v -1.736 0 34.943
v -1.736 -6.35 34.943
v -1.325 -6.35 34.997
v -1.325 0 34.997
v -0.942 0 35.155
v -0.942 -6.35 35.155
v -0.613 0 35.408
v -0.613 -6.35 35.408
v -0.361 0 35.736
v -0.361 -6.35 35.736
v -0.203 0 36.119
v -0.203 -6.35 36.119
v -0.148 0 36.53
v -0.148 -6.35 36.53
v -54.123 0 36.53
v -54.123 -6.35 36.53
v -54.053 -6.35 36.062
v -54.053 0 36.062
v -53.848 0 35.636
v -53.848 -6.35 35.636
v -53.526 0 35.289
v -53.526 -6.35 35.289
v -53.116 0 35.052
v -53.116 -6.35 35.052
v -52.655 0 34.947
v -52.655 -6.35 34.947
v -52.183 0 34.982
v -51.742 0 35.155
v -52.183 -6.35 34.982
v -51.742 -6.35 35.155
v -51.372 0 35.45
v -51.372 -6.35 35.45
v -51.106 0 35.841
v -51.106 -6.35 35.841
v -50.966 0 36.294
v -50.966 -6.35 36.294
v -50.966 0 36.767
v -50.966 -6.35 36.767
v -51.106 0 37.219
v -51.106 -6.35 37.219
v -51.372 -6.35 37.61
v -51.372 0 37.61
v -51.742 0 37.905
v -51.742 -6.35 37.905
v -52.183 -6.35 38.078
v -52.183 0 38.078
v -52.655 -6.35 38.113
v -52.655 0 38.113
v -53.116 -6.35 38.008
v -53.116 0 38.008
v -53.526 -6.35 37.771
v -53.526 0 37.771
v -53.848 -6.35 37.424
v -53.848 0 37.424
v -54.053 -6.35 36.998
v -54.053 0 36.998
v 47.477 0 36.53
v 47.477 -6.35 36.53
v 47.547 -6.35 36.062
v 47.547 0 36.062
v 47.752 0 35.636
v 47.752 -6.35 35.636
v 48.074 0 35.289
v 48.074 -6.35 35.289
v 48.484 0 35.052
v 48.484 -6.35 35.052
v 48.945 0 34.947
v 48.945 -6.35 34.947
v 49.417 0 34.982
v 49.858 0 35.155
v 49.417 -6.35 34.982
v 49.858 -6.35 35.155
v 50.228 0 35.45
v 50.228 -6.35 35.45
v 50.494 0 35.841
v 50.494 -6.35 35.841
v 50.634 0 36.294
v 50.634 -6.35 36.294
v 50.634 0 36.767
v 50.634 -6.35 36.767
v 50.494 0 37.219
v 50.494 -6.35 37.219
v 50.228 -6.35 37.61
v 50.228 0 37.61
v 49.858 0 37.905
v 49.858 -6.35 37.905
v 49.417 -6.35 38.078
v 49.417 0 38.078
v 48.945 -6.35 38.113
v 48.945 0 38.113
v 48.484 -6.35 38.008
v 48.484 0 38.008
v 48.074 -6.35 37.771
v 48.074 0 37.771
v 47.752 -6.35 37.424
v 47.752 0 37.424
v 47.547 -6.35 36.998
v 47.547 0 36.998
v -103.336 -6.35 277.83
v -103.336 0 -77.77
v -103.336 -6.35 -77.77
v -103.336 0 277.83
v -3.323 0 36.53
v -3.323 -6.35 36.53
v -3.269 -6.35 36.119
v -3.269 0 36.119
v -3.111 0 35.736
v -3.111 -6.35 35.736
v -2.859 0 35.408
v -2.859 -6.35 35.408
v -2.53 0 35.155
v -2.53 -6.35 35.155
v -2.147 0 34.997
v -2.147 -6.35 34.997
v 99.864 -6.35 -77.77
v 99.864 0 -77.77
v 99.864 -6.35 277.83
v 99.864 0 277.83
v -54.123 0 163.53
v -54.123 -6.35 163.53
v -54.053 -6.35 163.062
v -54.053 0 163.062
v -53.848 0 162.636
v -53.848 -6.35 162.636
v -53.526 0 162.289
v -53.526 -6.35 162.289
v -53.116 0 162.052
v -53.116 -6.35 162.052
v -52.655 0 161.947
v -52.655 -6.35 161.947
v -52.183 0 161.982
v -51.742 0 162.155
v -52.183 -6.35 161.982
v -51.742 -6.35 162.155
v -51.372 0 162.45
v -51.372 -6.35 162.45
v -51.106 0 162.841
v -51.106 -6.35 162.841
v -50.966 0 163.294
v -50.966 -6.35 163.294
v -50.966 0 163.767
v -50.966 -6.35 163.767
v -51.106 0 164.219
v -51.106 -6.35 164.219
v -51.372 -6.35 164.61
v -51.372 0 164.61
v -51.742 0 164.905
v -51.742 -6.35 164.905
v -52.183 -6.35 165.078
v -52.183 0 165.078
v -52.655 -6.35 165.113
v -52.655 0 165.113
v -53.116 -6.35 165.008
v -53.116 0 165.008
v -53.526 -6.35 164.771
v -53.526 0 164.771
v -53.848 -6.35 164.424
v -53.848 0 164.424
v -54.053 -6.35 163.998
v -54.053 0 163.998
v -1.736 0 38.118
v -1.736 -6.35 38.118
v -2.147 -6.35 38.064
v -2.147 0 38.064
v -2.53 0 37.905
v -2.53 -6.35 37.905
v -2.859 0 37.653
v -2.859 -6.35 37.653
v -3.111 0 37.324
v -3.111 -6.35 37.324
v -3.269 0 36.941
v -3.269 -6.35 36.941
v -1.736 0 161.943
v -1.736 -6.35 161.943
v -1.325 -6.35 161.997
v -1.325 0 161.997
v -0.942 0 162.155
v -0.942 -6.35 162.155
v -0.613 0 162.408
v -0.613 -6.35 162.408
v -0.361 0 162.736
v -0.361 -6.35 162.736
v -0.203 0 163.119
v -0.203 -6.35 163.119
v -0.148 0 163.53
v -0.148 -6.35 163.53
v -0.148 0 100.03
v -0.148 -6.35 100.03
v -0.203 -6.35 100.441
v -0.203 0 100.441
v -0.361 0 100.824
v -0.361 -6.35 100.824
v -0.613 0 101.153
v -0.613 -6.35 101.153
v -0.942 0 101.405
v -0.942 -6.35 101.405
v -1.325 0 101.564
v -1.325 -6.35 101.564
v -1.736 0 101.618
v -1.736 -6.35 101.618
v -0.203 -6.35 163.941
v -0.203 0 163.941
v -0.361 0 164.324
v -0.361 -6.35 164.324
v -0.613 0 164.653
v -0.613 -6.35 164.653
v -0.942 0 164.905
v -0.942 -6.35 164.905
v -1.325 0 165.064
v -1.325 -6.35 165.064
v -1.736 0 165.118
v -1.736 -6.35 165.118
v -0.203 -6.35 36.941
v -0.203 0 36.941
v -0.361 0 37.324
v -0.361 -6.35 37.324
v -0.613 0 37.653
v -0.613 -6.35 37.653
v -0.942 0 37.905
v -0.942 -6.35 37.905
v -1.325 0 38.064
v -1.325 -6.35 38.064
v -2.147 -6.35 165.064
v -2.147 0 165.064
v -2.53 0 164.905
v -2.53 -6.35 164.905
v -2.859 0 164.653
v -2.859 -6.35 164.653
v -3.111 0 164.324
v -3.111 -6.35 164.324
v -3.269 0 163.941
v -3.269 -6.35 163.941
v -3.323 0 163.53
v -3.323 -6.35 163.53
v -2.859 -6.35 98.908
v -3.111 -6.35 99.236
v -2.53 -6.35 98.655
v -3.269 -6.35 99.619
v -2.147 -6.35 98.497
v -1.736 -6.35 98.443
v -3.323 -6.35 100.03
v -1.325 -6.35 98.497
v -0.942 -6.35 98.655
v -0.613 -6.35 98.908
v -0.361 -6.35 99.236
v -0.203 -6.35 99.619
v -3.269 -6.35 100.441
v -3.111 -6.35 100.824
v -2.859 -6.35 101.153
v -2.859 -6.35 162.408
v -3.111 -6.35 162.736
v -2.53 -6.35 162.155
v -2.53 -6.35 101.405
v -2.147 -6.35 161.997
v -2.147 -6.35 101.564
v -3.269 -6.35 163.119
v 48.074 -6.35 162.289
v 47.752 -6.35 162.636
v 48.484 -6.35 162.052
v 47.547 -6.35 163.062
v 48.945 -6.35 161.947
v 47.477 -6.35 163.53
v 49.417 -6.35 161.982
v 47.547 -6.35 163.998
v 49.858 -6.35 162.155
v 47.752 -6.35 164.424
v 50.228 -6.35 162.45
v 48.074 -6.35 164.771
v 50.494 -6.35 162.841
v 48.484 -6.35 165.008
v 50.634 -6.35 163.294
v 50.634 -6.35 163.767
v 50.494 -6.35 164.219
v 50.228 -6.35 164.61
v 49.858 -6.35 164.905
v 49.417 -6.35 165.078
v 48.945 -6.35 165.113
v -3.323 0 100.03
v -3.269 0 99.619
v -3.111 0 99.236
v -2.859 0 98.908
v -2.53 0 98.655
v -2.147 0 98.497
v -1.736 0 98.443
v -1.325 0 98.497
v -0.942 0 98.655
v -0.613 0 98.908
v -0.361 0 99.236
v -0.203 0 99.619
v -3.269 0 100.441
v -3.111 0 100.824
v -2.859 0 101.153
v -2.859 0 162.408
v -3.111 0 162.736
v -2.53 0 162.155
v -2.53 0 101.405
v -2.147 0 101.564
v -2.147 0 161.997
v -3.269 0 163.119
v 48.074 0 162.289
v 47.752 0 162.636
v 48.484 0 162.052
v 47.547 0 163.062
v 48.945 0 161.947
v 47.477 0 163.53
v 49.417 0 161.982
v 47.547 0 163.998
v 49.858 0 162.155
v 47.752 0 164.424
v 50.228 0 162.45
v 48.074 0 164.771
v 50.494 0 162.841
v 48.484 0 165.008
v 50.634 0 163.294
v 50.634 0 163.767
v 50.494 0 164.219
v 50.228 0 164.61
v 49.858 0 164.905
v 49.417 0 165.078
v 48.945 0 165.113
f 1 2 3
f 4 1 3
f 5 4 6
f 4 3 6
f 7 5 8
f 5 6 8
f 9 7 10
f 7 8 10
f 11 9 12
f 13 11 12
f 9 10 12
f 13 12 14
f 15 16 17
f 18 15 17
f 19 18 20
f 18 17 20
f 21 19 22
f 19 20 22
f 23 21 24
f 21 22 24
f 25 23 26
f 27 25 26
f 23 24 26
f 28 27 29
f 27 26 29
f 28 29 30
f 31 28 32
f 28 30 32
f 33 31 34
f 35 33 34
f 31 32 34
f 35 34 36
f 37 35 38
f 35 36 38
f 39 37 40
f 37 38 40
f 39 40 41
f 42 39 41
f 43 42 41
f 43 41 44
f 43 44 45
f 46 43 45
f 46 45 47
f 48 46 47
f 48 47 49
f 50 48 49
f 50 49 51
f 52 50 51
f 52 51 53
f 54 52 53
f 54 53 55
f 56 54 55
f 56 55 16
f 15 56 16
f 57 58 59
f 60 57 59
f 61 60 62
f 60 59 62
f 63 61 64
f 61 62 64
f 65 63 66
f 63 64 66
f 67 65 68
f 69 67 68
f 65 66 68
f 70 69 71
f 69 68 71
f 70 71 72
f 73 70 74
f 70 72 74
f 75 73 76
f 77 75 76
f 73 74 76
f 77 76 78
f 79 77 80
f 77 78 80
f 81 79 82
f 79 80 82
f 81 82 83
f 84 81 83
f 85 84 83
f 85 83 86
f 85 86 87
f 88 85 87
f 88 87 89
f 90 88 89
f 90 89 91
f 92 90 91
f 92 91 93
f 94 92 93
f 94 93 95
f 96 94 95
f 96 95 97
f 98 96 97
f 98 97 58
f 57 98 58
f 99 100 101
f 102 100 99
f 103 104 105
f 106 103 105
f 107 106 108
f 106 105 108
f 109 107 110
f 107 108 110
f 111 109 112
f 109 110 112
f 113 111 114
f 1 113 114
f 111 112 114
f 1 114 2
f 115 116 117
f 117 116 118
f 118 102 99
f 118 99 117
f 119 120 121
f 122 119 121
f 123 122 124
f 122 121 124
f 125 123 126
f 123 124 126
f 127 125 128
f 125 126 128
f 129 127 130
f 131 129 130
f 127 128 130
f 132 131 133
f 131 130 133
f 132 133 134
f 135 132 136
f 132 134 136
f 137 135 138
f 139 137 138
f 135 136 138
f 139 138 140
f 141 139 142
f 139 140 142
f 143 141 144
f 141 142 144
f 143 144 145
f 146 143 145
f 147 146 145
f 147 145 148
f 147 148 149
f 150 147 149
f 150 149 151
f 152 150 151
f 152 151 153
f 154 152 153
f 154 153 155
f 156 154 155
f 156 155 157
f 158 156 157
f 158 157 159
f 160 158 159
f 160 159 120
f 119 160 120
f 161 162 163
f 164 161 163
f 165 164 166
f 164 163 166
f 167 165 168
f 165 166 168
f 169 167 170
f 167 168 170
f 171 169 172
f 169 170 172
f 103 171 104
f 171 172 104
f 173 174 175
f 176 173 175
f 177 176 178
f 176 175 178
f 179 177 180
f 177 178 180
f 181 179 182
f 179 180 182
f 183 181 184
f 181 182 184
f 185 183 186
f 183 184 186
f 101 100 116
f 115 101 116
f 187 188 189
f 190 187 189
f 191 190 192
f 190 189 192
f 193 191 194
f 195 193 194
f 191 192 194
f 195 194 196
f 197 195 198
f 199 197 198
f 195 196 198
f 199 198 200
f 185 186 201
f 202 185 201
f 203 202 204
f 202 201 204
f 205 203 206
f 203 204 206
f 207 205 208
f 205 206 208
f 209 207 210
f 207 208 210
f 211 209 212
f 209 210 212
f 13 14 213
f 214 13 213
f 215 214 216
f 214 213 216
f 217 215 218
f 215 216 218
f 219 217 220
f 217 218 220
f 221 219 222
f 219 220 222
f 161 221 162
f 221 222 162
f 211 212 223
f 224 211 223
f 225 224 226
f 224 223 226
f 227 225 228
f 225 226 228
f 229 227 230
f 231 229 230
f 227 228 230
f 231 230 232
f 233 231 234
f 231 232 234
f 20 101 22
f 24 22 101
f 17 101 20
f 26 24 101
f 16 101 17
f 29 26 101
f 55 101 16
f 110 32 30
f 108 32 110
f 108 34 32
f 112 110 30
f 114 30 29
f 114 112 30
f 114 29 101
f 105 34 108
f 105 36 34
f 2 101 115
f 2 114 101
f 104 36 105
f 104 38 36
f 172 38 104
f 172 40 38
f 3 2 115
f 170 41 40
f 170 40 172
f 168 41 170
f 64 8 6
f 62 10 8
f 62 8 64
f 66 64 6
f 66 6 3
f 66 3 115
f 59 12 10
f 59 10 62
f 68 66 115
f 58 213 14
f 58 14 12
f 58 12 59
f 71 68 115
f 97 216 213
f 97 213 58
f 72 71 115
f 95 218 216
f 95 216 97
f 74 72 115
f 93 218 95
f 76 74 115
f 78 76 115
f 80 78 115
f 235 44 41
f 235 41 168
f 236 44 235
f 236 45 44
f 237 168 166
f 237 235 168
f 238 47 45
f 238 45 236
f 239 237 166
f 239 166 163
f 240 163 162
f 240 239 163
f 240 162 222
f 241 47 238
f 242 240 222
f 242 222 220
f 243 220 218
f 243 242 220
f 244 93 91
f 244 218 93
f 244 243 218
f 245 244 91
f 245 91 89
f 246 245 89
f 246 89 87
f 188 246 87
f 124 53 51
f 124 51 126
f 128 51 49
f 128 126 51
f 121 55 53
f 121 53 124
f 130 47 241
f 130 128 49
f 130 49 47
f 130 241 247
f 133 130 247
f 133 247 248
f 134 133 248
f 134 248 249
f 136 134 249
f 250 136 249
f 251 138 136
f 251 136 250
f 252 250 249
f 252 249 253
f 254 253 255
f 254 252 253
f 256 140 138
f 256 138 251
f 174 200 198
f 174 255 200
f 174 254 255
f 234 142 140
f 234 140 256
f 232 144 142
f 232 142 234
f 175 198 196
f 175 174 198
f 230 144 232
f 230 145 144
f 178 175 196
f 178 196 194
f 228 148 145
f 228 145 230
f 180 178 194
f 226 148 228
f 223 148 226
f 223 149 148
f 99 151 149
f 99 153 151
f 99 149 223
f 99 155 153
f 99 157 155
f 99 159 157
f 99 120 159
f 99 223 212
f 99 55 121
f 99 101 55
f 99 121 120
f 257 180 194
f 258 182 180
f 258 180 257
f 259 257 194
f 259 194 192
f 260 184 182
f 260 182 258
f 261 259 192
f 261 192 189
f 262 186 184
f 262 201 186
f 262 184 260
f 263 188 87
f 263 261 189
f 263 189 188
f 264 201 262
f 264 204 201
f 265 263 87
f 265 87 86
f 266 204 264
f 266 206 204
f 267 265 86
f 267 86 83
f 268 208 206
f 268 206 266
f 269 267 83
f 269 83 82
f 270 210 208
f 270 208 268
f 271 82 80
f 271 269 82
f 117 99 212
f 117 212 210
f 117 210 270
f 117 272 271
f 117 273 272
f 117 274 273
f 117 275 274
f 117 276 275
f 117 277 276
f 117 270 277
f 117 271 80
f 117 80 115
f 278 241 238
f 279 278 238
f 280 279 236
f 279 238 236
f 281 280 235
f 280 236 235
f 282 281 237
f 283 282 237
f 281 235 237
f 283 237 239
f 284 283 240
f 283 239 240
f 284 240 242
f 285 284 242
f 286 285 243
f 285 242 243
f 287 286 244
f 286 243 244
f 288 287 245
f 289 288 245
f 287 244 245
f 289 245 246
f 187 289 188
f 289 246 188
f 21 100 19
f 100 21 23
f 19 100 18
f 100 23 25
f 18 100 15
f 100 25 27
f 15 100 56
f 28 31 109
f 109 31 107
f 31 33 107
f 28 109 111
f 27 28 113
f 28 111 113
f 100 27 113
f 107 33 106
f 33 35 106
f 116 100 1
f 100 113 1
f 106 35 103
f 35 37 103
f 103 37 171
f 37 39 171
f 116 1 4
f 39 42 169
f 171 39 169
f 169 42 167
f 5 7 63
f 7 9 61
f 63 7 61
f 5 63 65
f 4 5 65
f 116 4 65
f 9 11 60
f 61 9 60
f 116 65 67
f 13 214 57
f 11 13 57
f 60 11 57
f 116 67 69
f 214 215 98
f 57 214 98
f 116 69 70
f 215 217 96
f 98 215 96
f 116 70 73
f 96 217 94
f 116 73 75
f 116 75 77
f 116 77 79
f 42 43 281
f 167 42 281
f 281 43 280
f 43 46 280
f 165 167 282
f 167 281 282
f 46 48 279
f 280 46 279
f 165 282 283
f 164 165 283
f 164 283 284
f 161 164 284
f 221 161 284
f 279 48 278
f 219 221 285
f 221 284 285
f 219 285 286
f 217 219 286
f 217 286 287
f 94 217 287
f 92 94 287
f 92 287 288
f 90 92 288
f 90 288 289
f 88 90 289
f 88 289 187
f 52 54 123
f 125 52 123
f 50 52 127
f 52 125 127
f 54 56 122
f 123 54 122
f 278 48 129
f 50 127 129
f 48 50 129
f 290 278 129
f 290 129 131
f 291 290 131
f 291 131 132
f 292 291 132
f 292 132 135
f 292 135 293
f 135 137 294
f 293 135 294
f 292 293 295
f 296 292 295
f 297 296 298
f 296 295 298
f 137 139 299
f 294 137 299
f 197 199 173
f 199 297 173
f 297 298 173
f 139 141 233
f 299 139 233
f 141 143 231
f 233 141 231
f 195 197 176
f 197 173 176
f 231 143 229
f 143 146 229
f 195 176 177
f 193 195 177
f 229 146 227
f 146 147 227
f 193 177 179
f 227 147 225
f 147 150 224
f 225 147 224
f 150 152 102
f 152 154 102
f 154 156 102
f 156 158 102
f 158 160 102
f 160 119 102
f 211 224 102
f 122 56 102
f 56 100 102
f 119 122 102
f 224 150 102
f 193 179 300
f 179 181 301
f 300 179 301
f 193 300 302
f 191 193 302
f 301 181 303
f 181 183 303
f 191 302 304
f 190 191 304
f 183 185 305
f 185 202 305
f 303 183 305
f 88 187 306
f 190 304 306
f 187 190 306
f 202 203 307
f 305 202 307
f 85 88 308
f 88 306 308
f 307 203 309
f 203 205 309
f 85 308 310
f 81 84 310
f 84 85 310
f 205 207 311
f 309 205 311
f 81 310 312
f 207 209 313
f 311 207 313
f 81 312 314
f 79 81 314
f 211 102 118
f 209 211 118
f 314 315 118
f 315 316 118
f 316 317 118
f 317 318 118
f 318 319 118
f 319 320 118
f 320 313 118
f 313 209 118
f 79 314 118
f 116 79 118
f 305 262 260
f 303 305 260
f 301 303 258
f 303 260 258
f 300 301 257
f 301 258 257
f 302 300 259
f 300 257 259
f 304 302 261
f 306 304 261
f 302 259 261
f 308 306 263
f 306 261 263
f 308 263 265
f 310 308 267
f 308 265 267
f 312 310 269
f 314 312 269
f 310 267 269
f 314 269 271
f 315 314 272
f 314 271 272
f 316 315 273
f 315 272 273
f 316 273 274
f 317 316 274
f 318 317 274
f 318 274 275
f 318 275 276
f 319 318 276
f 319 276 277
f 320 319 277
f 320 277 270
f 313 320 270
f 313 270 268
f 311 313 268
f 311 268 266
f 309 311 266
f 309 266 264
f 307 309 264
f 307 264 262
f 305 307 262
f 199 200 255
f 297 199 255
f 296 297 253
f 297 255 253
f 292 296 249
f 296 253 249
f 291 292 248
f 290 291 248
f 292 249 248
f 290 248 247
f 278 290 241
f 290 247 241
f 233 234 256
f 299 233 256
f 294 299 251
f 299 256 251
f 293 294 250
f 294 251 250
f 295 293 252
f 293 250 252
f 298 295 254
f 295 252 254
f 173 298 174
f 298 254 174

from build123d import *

# Parameters (mm, degrees)
F0_W     = 203.2
F0_H     = 355.6
F1_DEPTH = 6.35
F3_DEPTH = 25.4


# Not quite as in the source:
# - a feature names something its author has since deleted; it is built from what else it names


with BuildPart() as f1:
    # F0 (on Front) → F1 (new body)
    with BuildSketch(Plane.XZ):
        with Locations((-1.7359743744, 100.030120313)):
            Rectangle(F0_W, F0_H)
    extrude(amount=F1_DEPTH)

    # F2 (on face) → F3 (cut)
    with BuildSketch(Plane.XZ.offset(6.35)):
        with BuildLine():
            Line((-1.7359743744, 100.030120313), (-0.1484743744, 100.030120313))
            ThreePointArc((-0.1484743744, 100.030120313), (-0.6134423593, 101.1526523282), (-1.7359743744, 101.617620313))
            Line((-1.7359743744, 101.617620313), (-1.7359743744, 100.030120313))
        make_face()
        with BuildLine():
            ThreePointArc((-1.7359743744, 98.442620313), (-0.6134423593, 98.9075882979), (-0.1484743744, 100.030120313))
            Line((-0.1484743744, 100.030120313), (-1.7359743744, 100.030120313))
            Line((-1.7359743744, 100.030120313), (-1.7359743744, 98.442620313))
        make_face()
        with BuildLine():
            Line((-1.7359743744, 100.030120313), (-1.7359743744, 101.617620313))
            ThreePointArc((-1.7359743744, 101.617620313), (-2.8585063895, 101.1526523282), (-3.3234743744, 100.030120313))
            Line((-3.3234743744, 100.030120313), (-1.7359743744, 100.030120313))
        make_face()
        with BuildLine():
            ThreePointArc((-3.3234743744, 100.030120313), (-2.8585063895, 98.9075882979), (-1.7359743744, 98.442620313))
            Line((-1.7359743744, 98.442620313), (-1.7359743744, 100.030120313))
            Line((-1.7359743744, 100.030120313), (-3.3234743744, 100.030120313))
        make_face()
        with BuildLine():
            Line((-1.7359743744, 163.530120313), (-1.7359743744, 161.942620313))
            ThreePointArc((-1.7359743744, 161.942620313), (-0.6134423593, 162.4075882979), (-0.1484743744, 163.530120313))
            Line((-0.1484743744, 163.530120313), (-1.7359743744, 163.530120313))
        make_face()
        with BuildLine():
            ThreePointArc((-3.3234743744, 163.530120313), (-2.8585063895, 162.4075882979), (-1.7359743744, 161.942620313))
            Line((-1.7359743744, 161.942620313), (-1.7359743744, 163.530120313))
            Line((-1.7359743744, 163.530120313), (-3.3234743744, 163.530120313))
        make_face()
        with BuildLine():
            Line((-1.7359743744, 36.530120313), (-1.7359743744, 38.117620313))
            ThreePointArc((-1.7359743744, 38.117620313), (-2.8585063895, 37.6526523282), (-3.3234743744, 36.530120313))
            Line((-3.3234743744, 36.530120313), (-1.7359743744, 36.530120313))
        make_face()
        with BuildLine():
            ThreePointArc((-0.1484743744, 36.530120313), (-0.6134423593, 37.6526523282), (-1.7359743744, 38.117620313))
            Line((-1.7359743744, 38.117620313), (-1.7359743744, 36.530120313))
            Line((-1.7359743744, 36.530120313), (-0.1484743744, 36.530120313))
        make_face()
        with BuildLine():
            ThreePointArc((-1.7359743744, 165.117620313), (-2.8585063895, 164.6526523282), (-3.3234743744, 163.530120313))
            Line((-3.3234743744, 163.530120313), (-1.7359743744, 163.530120313))
            Line((-1.7359743744, 163.530120313), (-1.7359743744, 165.117620313))
        make_face()
        with BuildLine():
            Line((-1.7359743744, 163.530120313), (-0.1484743744, 163.530120313))
            ThreePointArc((-0.1484743744, 163.530120313), (-0.6134423593, 164.6526523282), (-1.7359743744, 165.117620313))
            Line((-1.7359743744, 165.117620313), (-1.7359743744, 163.530120313))
        make_face()
        with BuildLine():
            ThreePointArc((-1.7359743744, 34.942620313), (-0.6134423593, 35.4075882979), (-0.1484743744, 36.530120313))
            Line((-0.1484743744, 36.530120313), (-1.7359743744, 36.530120313))
            Line((-1.7359743744, 36.530120313), (-1.7359743744, 34.942620313))
        make_face()
        with BuildLine():
            Line((-1.7359743744, 36.530120313), (-3.3234743744, 36.530120313))
            ThreePointArc((-3.3234743744, 36.530120313), (-2.8585063895, 35.4075882979), (-1.7359743744, 34.942620313))
            Line((-1.7359743744, 34.942620313), (-1.7359743744, 36.530120313))
        make_face()
        with BuildLine():
            Line((49.0640256256, 36.530120313), (50.6515256256, 36.530120313))
            ThreePointArc((50.6515256256, 36.530120313), (49.0640256256, 38.117620313), (47.4765256256, 36.530120313))
            Line((47.4765256256, 36.530120313), (49.0640256256, 36.530120313))
        make_face()
        with BuildLine():
            ThreePointArc((47.4765256256, 36.530120313), (49.0640256256, 34.942620313), (50.6515256256, 36.530120313))
            Line((50.6515256256, 36.530120313), (49.0640256256, 36.530120313))
            Line((49.0640256256, 36.530120313), (47.4765256256, 36.530120313))
        make_face()
        with BuildLine():
            Line((49.0640256256, 163.530120313), (50.6515256256, 163.530120313))
            ThreePointArc((50.6515256256, 163.530120313), (49.0640256256, 165.117620313), (47.4765256256, 163.530120313))
            Line((47.4765256256, 163.530120313), (49.0640256256, 163.530120313))
        make_face()
        with BuildLine():
            ThreePointArc((47.4765256256, 163.530120313), (49.0640256256, 161.942620313), (50.6515256256, 163.530120313))
            Line((50.6515256256, 163.530120313), (49.0640256256, 163.530120313))
            Line((49.0640256256, 163.530120313), (47.4765256256, 163.530120313))
        make_face()
        with BuildLine():
            Line((-52.5359743744, 163.530120313), (-50.9484743744, 163.530120313))
            ThreePointArc((-50.9484743744, 163.530120313), (-52.5359743744, 165.117620313), (-54.1234743744, 163.530120313))
            Line((-54.1234743744, 163.530120313), (-52.5359743744, 163.530120313))
        make_face()
        with BuildLine():
            ThreePointArc((-54.1234743744, 163.530120313), (-52.5359743744, 161.942620313), (-50.9484743744, 163.530120313))
            Line((-50.9484743744, 163.530120313), (-52.5359743744, 163.530120313))
            Line((-52.5359743744, 163.530120313), (-54.1234743744, 163.530120313))
        make_face()
        with BuildLine():
            Line((-52.5359743744, 36.530120313), (-50.9484743744, 36.530120313))
            ThreePointArc((-50.9484743744, 36.530120313), (-52.5359743744, 38.117620313), (-54.1234743744, 36.530120313))
            Line((-54.1234743744, 36.530120313), (-52.5359743744, 36.530120313))
        make_face()
        with BuildLine():
            ThreePointArc((-54.1234743744, 36.530120313), (-52.5359743744, 34.942620313), (-50.9484743744, 36.530120313))
            Line((-50.9484743744, 36.530120313), (-52.5359743744, 36.530120313))
            Line((-52.5359743744, 36.530120313), (-54.1234743744, 36.530120313))
        make_face()
    extrude(amount=-F3_DEPTH, mode=Mode.SUBTRACT)


solid = f1.part
